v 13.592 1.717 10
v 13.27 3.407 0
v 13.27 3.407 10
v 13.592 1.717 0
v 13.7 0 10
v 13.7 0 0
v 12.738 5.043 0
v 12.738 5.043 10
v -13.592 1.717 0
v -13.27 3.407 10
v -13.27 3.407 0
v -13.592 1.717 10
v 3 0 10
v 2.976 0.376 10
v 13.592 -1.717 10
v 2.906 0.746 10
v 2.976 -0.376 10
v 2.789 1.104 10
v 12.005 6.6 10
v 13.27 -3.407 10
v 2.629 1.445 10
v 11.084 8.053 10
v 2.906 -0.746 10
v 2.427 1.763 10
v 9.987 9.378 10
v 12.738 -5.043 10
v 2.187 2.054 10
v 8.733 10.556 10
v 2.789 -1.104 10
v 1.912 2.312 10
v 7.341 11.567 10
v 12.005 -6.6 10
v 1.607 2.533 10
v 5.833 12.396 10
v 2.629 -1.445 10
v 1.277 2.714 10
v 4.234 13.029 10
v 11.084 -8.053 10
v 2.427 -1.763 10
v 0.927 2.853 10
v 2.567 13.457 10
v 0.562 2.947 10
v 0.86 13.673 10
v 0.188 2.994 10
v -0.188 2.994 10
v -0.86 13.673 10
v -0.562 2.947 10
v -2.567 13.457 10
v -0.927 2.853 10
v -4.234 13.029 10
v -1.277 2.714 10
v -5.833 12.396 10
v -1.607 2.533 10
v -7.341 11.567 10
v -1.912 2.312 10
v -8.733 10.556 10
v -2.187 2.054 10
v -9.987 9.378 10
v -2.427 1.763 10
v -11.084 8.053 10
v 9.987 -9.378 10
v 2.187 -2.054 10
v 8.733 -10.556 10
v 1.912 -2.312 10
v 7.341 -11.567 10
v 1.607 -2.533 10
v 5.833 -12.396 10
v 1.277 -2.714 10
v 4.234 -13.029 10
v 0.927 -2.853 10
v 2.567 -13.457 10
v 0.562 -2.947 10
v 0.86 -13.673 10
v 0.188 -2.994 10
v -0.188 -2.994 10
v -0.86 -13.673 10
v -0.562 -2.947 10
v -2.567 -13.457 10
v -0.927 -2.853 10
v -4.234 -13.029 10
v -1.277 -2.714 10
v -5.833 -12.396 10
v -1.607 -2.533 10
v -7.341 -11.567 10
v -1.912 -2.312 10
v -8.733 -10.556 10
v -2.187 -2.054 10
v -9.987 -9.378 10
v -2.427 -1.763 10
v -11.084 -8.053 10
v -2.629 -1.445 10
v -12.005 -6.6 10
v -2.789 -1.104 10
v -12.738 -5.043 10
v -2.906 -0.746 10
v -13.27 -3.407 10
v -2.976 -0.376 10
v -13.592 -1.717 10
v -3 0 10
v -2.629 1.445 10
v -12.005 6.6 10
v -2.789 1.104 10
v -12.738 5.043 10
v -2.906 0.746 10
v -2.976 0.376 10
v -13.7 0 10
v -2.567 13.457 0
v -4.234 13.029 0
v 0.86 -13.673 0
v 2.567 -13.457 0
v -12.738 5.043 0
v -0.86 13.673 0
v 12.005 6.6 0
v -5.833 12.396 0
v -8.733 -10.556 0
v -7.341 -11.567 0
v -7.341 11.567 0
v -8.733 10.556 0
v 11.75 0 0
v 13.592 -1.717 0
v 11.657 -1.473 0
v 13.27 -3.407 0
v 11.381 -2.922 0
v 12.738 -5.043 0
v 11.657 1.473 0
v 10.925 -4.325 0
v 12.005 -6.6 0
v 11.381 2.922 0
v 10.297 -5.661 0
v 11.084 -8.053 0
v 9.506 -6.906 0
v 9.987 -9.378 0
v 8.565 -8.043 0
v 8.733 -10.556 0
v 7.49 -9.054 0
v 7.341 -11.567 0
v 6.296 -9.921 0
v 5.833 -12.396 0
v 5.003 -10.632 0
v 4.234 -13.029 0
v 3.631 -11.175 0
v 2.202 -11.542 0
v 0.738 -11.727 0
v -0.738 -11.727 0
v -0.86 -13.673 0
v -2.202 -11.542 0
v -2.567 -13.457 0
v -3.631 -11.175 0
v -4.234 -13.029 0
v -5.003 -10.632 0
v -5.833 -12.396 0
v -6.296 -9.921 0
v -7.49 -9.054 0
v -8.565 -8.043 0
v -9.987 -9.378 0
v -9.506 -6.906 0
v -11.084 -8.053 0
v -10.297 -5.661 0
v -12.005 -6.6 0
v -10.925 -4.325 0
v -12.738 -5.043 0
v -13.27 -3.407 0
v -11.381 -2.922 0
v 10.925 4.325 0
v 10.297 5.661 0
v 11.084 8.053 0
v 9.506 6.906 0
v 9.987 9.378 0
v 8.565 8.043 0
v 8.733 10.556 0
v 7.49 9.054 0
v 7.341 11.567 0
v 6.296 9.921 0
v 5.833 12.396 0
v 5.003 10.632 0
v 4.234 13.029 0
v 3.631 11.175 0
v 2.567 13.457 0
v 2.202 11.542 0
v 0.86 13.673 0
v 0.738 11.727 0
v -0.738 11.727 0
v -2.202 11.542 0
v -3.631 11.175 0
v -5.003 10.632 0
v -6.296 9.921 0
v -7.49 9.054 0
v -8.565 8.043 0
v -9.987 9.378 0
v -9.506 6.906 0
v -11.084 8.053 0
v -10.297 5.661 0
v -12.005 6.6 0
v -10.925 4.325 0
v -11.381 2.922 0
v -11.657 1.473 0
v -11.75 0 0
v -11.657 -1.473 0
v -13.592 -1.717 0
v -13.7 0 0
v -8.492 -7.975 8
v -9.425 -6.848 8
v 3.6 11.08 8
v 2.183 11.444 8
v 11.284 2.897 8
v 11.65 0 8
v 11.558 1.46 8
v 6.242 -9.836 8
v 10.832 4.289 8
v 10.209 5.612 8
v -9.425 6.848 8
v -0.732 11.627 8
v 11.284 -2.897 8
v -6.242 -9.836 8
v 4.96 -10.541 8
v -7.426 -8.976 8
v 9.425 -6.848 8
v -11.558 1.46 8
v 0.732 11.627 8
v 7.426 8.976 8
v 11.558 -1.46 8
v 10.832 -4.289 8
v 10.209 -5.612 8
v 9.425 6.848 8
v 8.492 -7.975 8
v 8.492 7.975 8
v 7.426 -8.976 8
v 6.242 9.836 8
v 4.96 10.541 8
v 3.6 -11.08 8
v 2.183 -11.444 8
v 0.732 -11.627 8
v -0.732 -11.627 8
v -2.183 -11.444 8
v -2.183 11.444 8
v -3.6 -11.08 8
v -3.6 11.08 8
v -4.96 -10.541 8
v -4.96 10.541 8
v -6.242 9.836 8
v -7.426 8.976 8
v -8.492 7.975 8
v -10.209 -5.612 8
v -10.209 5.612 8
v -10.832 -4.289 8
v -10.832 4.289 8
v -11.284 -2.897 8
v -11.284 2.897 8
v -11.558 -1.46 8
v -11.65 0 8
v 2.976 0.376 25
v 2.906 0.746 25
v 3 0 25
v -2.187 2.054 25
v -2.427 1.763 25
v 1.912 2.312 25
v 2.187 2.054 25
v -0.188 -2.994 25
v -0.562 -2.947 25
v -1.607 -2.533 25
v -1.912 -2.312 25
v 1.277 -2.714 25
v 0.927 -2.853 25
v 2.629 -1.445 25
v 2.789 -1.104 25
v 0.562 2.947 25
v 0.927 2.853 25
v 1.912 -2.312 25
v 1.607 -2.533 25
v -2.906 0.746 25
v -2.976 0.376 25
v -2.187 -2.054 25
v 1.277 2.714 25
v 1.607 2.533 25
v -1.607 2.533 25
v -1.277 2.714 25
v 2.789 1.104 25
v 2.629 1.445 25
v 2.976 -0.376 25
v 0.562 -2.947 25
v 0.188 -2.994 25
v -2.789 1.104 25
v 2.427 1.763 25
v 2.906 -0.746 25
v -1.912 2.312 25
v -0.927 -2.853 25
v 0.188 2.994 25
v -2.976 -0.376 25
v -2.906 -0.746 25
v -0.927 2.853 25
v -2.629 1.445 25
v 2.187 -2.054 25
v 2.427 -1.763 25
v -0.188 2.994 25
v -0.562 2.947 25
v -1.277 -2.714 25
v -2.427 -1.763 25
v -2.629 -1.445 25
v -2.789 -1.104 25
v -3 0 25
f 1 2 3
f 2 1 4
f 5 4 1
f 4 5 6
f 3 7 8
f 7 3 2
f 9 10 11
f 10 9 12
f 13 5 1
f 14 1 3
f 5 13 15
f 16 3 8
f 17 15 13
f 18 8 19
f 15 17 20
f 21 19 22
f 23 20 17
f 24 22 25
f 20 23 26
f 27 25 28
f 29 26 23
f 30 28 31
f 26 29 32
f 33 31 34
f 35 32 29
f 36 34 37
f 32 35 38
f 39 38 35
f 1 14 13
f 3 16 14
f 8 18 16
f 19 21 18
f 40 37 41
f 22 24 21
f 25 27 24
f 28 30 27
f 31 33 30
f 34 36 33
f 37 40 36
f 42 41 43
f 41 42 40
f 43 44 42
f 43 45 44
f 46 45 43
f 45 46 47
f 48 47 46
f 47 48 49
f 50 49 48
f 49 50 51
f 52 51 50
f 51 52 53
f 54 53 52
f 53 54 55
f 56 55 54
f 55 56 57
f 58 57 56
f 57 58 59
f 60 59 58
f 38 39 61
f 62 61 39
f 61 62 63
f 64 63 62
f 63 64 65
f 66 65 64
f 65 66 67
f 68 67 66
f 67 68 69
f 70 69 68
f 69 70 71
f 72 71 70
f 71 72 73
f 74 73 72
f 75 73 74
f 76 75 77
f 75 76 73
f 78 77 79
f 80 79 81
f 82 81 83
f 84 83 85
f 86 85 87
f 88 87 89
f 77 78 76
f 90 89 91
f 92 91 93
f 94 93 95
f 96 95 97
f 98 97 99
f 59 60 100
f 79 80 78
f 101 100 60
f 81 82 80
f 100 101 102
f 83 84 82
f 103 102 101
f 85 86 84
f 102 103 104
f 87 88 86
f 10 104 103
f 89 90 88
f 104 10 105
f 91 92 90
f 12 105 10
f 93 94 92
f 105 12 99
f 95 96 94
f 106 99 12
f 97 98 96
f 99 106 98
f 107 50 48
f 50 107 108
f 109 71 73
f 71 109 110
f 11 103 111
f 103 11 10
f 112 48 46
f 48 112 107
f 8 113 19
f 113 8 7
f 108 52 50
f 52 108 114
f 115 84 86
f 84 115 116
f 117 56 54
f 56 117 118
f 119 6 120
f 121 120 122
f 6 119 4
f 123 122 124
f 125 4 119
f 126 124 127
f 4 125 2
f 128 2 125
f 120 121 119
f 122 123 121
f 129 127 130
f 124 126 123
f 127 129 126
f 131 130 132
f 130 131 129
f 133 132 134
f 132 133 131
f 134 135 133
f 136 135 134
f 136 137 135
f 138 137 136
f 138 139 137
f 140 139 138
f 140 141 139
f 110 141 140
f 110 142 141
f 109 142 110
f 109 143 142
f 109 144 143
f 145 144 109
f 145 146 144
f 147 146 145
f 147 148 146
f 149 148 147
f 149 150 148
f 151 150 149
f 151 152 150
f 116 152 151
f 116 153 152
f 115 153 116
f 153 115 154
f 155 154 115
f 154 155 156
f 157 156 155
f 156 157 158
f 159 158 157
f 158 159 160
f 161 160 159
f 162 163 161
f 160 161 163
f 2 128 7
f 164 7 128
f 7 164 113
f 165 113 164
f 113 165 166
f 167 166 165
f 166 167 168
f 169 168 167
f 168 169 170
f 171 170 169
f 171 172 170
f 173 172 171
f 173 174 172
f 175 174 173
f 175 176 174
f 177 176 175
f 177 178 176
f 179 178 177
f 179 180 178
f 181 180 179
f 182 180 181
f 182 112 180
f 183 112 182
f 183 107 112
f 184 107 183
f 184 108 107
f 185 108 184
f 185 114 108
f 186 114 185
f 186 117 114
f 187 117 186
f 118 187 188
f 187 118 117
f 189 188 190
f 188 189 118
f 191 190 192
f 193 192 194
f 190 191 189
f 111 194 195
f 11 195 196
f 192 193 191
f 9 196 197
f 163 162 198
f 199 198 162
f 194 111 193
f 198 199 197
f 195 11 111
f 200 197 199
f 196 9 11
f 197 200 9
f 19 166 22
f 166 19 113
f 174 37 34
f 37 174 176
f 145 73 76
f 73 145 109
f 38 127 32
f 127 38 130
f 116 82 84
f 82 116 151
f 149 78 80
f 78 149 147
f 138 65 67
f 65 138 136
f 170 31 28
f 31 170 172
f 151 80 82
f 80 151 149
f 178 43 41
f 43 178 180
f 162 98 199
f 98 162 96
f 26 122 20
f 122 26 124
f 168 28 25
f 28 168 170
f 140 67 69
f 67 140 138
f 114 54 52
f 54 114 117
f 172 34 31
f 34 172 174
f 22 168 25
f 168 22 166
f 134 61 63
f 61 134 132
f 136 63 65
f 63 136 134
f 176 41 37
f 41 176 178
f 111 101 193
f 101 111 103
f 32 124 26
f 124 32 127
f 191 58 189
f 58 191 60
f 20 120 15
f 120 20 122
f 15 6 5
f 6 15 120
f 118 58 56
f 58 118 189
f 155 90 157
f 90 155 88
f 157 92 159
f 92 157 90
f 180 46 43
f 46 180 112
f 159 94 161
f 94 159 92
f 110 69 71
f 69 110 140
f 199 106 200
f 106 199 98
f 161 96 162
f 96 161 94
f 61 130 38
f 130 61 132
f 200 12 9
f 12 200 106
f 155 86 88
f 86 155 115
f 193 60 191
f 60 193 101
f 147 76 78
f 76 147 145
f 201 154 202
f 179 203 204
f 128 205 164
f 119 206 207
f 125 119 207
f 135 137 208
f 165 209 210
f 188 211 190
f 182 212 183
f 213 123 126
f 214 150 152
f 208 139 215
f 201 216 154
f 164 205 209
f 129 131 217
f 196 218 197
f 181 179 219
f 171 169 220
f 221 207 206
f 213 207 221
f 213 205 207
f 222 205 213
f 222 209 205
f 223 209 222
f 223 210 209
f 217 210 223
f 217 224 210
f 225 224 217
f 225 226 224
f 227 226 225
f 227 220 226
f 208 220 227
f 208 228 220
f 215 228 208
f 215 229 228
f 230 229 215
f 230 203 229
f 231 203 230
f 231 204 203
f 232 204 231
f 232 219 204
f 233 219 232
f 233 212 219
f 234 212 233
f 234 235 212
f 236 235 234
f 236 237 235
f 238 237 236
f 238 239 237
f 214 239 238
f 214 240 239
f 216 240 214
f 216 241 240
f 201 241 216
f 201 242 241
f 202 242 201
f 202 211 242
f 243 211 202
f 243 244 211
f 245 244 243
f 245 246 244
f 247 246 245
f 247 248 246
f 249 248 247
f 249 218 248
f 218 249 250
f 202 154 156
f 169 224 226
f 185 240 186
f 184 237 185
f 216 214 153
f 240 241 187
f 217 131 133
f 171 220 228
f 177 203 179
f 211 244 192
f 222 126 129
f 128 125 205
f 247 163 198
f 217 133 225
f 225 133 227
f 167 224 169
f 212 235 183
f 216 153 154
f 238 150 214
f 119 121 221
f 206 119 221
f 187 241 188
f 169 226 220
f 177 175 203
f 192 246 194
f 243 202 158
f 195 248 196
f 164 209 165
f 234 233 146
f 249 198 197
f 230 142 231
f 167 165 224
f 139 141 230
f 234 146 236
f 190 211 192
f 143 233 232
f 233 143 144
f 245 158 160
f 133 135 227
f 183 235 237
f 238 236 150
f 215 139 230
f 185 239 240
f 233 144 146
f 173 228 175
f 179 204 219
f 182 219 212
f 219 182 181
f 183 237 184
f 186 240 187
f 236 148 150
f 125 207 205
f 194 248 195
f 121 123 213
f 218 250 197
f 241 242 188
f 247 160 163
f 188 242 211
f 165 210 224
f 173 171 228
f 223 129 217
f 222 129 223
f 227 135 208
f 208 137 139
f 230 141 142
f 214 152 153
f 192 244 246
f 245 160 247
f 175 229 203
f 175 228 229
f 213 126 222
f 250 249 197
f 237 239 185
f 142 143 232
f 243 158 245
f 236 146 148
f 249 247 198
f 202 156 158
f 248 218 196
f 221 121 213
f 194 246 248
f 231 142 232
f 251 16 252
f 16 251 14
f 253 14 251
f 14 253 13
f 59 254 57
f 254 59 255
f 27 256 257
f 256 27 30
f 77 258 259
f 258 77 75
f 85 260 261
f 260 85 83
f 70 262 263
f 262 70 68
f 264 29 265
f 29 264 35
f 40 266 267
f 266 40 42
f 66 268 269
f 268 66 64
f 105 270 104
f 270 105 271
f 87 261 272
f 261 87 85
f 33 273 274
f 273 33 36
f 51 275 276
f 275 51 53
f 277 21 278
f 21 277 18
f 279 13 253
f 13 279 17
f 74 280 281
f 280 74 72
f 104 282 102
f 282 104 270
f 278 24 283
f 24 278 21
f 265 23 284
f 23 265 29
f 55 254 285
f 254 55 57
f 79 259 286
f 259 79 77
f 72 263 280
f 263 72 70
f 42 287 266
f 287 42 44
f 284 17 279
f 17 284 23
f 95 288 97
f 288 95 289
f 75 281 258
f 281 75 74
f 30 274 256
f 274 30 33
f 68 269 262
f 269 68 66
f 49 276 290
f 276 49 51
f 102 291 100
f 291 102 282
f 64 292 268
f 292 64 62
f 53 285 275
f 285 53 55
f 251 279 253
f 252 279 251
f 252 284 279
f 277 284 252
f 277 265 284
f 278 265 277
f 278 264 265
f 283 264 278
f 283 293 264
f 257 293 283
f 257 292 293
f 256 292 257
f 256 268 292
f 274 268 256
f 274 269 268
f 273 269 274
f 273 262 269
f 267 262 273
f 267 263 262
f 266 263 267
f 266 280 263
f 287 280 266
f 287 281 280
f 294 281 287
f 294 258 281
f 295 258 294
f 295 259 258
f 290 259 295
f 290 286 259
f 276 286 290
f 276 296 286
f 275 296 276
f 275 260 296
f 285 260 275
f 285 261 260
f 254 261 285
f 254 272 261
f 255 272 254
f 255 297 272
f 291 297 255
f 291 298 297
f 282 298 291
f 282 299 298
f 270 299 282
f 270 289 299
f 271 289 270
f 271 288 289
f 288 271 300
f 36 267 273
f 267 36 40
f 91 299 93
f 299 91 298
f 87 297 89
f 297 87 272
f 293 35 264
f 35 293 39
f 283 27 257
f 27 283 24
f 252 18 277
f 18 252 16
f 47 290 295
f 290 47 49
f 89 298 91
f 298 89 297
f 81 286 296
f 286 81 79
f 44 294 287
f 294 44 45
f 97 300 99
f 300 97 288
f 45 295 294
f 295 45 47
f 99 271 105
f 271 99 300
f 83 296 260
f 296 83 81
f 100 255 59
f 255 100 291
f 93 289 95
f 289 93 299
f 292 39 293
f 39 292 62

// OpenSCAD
// Holder
$fn=50;
translate([0,0,10])
cylinder(d=6, h=15);
difference(){
cylinder(d=27.4, h=10);
  cylinder(d1=23.5, d2=23.3, h=8);
}

/*
// Centre finder
$fn=50;
difference(){
  cylinder(d=25.4, h=3);
  translate([0,0,1])
  cylinder(d1=23.5, d2=23.2, h=2);
  cylinder(d1=3, d2=1, h=1);
}
*/
